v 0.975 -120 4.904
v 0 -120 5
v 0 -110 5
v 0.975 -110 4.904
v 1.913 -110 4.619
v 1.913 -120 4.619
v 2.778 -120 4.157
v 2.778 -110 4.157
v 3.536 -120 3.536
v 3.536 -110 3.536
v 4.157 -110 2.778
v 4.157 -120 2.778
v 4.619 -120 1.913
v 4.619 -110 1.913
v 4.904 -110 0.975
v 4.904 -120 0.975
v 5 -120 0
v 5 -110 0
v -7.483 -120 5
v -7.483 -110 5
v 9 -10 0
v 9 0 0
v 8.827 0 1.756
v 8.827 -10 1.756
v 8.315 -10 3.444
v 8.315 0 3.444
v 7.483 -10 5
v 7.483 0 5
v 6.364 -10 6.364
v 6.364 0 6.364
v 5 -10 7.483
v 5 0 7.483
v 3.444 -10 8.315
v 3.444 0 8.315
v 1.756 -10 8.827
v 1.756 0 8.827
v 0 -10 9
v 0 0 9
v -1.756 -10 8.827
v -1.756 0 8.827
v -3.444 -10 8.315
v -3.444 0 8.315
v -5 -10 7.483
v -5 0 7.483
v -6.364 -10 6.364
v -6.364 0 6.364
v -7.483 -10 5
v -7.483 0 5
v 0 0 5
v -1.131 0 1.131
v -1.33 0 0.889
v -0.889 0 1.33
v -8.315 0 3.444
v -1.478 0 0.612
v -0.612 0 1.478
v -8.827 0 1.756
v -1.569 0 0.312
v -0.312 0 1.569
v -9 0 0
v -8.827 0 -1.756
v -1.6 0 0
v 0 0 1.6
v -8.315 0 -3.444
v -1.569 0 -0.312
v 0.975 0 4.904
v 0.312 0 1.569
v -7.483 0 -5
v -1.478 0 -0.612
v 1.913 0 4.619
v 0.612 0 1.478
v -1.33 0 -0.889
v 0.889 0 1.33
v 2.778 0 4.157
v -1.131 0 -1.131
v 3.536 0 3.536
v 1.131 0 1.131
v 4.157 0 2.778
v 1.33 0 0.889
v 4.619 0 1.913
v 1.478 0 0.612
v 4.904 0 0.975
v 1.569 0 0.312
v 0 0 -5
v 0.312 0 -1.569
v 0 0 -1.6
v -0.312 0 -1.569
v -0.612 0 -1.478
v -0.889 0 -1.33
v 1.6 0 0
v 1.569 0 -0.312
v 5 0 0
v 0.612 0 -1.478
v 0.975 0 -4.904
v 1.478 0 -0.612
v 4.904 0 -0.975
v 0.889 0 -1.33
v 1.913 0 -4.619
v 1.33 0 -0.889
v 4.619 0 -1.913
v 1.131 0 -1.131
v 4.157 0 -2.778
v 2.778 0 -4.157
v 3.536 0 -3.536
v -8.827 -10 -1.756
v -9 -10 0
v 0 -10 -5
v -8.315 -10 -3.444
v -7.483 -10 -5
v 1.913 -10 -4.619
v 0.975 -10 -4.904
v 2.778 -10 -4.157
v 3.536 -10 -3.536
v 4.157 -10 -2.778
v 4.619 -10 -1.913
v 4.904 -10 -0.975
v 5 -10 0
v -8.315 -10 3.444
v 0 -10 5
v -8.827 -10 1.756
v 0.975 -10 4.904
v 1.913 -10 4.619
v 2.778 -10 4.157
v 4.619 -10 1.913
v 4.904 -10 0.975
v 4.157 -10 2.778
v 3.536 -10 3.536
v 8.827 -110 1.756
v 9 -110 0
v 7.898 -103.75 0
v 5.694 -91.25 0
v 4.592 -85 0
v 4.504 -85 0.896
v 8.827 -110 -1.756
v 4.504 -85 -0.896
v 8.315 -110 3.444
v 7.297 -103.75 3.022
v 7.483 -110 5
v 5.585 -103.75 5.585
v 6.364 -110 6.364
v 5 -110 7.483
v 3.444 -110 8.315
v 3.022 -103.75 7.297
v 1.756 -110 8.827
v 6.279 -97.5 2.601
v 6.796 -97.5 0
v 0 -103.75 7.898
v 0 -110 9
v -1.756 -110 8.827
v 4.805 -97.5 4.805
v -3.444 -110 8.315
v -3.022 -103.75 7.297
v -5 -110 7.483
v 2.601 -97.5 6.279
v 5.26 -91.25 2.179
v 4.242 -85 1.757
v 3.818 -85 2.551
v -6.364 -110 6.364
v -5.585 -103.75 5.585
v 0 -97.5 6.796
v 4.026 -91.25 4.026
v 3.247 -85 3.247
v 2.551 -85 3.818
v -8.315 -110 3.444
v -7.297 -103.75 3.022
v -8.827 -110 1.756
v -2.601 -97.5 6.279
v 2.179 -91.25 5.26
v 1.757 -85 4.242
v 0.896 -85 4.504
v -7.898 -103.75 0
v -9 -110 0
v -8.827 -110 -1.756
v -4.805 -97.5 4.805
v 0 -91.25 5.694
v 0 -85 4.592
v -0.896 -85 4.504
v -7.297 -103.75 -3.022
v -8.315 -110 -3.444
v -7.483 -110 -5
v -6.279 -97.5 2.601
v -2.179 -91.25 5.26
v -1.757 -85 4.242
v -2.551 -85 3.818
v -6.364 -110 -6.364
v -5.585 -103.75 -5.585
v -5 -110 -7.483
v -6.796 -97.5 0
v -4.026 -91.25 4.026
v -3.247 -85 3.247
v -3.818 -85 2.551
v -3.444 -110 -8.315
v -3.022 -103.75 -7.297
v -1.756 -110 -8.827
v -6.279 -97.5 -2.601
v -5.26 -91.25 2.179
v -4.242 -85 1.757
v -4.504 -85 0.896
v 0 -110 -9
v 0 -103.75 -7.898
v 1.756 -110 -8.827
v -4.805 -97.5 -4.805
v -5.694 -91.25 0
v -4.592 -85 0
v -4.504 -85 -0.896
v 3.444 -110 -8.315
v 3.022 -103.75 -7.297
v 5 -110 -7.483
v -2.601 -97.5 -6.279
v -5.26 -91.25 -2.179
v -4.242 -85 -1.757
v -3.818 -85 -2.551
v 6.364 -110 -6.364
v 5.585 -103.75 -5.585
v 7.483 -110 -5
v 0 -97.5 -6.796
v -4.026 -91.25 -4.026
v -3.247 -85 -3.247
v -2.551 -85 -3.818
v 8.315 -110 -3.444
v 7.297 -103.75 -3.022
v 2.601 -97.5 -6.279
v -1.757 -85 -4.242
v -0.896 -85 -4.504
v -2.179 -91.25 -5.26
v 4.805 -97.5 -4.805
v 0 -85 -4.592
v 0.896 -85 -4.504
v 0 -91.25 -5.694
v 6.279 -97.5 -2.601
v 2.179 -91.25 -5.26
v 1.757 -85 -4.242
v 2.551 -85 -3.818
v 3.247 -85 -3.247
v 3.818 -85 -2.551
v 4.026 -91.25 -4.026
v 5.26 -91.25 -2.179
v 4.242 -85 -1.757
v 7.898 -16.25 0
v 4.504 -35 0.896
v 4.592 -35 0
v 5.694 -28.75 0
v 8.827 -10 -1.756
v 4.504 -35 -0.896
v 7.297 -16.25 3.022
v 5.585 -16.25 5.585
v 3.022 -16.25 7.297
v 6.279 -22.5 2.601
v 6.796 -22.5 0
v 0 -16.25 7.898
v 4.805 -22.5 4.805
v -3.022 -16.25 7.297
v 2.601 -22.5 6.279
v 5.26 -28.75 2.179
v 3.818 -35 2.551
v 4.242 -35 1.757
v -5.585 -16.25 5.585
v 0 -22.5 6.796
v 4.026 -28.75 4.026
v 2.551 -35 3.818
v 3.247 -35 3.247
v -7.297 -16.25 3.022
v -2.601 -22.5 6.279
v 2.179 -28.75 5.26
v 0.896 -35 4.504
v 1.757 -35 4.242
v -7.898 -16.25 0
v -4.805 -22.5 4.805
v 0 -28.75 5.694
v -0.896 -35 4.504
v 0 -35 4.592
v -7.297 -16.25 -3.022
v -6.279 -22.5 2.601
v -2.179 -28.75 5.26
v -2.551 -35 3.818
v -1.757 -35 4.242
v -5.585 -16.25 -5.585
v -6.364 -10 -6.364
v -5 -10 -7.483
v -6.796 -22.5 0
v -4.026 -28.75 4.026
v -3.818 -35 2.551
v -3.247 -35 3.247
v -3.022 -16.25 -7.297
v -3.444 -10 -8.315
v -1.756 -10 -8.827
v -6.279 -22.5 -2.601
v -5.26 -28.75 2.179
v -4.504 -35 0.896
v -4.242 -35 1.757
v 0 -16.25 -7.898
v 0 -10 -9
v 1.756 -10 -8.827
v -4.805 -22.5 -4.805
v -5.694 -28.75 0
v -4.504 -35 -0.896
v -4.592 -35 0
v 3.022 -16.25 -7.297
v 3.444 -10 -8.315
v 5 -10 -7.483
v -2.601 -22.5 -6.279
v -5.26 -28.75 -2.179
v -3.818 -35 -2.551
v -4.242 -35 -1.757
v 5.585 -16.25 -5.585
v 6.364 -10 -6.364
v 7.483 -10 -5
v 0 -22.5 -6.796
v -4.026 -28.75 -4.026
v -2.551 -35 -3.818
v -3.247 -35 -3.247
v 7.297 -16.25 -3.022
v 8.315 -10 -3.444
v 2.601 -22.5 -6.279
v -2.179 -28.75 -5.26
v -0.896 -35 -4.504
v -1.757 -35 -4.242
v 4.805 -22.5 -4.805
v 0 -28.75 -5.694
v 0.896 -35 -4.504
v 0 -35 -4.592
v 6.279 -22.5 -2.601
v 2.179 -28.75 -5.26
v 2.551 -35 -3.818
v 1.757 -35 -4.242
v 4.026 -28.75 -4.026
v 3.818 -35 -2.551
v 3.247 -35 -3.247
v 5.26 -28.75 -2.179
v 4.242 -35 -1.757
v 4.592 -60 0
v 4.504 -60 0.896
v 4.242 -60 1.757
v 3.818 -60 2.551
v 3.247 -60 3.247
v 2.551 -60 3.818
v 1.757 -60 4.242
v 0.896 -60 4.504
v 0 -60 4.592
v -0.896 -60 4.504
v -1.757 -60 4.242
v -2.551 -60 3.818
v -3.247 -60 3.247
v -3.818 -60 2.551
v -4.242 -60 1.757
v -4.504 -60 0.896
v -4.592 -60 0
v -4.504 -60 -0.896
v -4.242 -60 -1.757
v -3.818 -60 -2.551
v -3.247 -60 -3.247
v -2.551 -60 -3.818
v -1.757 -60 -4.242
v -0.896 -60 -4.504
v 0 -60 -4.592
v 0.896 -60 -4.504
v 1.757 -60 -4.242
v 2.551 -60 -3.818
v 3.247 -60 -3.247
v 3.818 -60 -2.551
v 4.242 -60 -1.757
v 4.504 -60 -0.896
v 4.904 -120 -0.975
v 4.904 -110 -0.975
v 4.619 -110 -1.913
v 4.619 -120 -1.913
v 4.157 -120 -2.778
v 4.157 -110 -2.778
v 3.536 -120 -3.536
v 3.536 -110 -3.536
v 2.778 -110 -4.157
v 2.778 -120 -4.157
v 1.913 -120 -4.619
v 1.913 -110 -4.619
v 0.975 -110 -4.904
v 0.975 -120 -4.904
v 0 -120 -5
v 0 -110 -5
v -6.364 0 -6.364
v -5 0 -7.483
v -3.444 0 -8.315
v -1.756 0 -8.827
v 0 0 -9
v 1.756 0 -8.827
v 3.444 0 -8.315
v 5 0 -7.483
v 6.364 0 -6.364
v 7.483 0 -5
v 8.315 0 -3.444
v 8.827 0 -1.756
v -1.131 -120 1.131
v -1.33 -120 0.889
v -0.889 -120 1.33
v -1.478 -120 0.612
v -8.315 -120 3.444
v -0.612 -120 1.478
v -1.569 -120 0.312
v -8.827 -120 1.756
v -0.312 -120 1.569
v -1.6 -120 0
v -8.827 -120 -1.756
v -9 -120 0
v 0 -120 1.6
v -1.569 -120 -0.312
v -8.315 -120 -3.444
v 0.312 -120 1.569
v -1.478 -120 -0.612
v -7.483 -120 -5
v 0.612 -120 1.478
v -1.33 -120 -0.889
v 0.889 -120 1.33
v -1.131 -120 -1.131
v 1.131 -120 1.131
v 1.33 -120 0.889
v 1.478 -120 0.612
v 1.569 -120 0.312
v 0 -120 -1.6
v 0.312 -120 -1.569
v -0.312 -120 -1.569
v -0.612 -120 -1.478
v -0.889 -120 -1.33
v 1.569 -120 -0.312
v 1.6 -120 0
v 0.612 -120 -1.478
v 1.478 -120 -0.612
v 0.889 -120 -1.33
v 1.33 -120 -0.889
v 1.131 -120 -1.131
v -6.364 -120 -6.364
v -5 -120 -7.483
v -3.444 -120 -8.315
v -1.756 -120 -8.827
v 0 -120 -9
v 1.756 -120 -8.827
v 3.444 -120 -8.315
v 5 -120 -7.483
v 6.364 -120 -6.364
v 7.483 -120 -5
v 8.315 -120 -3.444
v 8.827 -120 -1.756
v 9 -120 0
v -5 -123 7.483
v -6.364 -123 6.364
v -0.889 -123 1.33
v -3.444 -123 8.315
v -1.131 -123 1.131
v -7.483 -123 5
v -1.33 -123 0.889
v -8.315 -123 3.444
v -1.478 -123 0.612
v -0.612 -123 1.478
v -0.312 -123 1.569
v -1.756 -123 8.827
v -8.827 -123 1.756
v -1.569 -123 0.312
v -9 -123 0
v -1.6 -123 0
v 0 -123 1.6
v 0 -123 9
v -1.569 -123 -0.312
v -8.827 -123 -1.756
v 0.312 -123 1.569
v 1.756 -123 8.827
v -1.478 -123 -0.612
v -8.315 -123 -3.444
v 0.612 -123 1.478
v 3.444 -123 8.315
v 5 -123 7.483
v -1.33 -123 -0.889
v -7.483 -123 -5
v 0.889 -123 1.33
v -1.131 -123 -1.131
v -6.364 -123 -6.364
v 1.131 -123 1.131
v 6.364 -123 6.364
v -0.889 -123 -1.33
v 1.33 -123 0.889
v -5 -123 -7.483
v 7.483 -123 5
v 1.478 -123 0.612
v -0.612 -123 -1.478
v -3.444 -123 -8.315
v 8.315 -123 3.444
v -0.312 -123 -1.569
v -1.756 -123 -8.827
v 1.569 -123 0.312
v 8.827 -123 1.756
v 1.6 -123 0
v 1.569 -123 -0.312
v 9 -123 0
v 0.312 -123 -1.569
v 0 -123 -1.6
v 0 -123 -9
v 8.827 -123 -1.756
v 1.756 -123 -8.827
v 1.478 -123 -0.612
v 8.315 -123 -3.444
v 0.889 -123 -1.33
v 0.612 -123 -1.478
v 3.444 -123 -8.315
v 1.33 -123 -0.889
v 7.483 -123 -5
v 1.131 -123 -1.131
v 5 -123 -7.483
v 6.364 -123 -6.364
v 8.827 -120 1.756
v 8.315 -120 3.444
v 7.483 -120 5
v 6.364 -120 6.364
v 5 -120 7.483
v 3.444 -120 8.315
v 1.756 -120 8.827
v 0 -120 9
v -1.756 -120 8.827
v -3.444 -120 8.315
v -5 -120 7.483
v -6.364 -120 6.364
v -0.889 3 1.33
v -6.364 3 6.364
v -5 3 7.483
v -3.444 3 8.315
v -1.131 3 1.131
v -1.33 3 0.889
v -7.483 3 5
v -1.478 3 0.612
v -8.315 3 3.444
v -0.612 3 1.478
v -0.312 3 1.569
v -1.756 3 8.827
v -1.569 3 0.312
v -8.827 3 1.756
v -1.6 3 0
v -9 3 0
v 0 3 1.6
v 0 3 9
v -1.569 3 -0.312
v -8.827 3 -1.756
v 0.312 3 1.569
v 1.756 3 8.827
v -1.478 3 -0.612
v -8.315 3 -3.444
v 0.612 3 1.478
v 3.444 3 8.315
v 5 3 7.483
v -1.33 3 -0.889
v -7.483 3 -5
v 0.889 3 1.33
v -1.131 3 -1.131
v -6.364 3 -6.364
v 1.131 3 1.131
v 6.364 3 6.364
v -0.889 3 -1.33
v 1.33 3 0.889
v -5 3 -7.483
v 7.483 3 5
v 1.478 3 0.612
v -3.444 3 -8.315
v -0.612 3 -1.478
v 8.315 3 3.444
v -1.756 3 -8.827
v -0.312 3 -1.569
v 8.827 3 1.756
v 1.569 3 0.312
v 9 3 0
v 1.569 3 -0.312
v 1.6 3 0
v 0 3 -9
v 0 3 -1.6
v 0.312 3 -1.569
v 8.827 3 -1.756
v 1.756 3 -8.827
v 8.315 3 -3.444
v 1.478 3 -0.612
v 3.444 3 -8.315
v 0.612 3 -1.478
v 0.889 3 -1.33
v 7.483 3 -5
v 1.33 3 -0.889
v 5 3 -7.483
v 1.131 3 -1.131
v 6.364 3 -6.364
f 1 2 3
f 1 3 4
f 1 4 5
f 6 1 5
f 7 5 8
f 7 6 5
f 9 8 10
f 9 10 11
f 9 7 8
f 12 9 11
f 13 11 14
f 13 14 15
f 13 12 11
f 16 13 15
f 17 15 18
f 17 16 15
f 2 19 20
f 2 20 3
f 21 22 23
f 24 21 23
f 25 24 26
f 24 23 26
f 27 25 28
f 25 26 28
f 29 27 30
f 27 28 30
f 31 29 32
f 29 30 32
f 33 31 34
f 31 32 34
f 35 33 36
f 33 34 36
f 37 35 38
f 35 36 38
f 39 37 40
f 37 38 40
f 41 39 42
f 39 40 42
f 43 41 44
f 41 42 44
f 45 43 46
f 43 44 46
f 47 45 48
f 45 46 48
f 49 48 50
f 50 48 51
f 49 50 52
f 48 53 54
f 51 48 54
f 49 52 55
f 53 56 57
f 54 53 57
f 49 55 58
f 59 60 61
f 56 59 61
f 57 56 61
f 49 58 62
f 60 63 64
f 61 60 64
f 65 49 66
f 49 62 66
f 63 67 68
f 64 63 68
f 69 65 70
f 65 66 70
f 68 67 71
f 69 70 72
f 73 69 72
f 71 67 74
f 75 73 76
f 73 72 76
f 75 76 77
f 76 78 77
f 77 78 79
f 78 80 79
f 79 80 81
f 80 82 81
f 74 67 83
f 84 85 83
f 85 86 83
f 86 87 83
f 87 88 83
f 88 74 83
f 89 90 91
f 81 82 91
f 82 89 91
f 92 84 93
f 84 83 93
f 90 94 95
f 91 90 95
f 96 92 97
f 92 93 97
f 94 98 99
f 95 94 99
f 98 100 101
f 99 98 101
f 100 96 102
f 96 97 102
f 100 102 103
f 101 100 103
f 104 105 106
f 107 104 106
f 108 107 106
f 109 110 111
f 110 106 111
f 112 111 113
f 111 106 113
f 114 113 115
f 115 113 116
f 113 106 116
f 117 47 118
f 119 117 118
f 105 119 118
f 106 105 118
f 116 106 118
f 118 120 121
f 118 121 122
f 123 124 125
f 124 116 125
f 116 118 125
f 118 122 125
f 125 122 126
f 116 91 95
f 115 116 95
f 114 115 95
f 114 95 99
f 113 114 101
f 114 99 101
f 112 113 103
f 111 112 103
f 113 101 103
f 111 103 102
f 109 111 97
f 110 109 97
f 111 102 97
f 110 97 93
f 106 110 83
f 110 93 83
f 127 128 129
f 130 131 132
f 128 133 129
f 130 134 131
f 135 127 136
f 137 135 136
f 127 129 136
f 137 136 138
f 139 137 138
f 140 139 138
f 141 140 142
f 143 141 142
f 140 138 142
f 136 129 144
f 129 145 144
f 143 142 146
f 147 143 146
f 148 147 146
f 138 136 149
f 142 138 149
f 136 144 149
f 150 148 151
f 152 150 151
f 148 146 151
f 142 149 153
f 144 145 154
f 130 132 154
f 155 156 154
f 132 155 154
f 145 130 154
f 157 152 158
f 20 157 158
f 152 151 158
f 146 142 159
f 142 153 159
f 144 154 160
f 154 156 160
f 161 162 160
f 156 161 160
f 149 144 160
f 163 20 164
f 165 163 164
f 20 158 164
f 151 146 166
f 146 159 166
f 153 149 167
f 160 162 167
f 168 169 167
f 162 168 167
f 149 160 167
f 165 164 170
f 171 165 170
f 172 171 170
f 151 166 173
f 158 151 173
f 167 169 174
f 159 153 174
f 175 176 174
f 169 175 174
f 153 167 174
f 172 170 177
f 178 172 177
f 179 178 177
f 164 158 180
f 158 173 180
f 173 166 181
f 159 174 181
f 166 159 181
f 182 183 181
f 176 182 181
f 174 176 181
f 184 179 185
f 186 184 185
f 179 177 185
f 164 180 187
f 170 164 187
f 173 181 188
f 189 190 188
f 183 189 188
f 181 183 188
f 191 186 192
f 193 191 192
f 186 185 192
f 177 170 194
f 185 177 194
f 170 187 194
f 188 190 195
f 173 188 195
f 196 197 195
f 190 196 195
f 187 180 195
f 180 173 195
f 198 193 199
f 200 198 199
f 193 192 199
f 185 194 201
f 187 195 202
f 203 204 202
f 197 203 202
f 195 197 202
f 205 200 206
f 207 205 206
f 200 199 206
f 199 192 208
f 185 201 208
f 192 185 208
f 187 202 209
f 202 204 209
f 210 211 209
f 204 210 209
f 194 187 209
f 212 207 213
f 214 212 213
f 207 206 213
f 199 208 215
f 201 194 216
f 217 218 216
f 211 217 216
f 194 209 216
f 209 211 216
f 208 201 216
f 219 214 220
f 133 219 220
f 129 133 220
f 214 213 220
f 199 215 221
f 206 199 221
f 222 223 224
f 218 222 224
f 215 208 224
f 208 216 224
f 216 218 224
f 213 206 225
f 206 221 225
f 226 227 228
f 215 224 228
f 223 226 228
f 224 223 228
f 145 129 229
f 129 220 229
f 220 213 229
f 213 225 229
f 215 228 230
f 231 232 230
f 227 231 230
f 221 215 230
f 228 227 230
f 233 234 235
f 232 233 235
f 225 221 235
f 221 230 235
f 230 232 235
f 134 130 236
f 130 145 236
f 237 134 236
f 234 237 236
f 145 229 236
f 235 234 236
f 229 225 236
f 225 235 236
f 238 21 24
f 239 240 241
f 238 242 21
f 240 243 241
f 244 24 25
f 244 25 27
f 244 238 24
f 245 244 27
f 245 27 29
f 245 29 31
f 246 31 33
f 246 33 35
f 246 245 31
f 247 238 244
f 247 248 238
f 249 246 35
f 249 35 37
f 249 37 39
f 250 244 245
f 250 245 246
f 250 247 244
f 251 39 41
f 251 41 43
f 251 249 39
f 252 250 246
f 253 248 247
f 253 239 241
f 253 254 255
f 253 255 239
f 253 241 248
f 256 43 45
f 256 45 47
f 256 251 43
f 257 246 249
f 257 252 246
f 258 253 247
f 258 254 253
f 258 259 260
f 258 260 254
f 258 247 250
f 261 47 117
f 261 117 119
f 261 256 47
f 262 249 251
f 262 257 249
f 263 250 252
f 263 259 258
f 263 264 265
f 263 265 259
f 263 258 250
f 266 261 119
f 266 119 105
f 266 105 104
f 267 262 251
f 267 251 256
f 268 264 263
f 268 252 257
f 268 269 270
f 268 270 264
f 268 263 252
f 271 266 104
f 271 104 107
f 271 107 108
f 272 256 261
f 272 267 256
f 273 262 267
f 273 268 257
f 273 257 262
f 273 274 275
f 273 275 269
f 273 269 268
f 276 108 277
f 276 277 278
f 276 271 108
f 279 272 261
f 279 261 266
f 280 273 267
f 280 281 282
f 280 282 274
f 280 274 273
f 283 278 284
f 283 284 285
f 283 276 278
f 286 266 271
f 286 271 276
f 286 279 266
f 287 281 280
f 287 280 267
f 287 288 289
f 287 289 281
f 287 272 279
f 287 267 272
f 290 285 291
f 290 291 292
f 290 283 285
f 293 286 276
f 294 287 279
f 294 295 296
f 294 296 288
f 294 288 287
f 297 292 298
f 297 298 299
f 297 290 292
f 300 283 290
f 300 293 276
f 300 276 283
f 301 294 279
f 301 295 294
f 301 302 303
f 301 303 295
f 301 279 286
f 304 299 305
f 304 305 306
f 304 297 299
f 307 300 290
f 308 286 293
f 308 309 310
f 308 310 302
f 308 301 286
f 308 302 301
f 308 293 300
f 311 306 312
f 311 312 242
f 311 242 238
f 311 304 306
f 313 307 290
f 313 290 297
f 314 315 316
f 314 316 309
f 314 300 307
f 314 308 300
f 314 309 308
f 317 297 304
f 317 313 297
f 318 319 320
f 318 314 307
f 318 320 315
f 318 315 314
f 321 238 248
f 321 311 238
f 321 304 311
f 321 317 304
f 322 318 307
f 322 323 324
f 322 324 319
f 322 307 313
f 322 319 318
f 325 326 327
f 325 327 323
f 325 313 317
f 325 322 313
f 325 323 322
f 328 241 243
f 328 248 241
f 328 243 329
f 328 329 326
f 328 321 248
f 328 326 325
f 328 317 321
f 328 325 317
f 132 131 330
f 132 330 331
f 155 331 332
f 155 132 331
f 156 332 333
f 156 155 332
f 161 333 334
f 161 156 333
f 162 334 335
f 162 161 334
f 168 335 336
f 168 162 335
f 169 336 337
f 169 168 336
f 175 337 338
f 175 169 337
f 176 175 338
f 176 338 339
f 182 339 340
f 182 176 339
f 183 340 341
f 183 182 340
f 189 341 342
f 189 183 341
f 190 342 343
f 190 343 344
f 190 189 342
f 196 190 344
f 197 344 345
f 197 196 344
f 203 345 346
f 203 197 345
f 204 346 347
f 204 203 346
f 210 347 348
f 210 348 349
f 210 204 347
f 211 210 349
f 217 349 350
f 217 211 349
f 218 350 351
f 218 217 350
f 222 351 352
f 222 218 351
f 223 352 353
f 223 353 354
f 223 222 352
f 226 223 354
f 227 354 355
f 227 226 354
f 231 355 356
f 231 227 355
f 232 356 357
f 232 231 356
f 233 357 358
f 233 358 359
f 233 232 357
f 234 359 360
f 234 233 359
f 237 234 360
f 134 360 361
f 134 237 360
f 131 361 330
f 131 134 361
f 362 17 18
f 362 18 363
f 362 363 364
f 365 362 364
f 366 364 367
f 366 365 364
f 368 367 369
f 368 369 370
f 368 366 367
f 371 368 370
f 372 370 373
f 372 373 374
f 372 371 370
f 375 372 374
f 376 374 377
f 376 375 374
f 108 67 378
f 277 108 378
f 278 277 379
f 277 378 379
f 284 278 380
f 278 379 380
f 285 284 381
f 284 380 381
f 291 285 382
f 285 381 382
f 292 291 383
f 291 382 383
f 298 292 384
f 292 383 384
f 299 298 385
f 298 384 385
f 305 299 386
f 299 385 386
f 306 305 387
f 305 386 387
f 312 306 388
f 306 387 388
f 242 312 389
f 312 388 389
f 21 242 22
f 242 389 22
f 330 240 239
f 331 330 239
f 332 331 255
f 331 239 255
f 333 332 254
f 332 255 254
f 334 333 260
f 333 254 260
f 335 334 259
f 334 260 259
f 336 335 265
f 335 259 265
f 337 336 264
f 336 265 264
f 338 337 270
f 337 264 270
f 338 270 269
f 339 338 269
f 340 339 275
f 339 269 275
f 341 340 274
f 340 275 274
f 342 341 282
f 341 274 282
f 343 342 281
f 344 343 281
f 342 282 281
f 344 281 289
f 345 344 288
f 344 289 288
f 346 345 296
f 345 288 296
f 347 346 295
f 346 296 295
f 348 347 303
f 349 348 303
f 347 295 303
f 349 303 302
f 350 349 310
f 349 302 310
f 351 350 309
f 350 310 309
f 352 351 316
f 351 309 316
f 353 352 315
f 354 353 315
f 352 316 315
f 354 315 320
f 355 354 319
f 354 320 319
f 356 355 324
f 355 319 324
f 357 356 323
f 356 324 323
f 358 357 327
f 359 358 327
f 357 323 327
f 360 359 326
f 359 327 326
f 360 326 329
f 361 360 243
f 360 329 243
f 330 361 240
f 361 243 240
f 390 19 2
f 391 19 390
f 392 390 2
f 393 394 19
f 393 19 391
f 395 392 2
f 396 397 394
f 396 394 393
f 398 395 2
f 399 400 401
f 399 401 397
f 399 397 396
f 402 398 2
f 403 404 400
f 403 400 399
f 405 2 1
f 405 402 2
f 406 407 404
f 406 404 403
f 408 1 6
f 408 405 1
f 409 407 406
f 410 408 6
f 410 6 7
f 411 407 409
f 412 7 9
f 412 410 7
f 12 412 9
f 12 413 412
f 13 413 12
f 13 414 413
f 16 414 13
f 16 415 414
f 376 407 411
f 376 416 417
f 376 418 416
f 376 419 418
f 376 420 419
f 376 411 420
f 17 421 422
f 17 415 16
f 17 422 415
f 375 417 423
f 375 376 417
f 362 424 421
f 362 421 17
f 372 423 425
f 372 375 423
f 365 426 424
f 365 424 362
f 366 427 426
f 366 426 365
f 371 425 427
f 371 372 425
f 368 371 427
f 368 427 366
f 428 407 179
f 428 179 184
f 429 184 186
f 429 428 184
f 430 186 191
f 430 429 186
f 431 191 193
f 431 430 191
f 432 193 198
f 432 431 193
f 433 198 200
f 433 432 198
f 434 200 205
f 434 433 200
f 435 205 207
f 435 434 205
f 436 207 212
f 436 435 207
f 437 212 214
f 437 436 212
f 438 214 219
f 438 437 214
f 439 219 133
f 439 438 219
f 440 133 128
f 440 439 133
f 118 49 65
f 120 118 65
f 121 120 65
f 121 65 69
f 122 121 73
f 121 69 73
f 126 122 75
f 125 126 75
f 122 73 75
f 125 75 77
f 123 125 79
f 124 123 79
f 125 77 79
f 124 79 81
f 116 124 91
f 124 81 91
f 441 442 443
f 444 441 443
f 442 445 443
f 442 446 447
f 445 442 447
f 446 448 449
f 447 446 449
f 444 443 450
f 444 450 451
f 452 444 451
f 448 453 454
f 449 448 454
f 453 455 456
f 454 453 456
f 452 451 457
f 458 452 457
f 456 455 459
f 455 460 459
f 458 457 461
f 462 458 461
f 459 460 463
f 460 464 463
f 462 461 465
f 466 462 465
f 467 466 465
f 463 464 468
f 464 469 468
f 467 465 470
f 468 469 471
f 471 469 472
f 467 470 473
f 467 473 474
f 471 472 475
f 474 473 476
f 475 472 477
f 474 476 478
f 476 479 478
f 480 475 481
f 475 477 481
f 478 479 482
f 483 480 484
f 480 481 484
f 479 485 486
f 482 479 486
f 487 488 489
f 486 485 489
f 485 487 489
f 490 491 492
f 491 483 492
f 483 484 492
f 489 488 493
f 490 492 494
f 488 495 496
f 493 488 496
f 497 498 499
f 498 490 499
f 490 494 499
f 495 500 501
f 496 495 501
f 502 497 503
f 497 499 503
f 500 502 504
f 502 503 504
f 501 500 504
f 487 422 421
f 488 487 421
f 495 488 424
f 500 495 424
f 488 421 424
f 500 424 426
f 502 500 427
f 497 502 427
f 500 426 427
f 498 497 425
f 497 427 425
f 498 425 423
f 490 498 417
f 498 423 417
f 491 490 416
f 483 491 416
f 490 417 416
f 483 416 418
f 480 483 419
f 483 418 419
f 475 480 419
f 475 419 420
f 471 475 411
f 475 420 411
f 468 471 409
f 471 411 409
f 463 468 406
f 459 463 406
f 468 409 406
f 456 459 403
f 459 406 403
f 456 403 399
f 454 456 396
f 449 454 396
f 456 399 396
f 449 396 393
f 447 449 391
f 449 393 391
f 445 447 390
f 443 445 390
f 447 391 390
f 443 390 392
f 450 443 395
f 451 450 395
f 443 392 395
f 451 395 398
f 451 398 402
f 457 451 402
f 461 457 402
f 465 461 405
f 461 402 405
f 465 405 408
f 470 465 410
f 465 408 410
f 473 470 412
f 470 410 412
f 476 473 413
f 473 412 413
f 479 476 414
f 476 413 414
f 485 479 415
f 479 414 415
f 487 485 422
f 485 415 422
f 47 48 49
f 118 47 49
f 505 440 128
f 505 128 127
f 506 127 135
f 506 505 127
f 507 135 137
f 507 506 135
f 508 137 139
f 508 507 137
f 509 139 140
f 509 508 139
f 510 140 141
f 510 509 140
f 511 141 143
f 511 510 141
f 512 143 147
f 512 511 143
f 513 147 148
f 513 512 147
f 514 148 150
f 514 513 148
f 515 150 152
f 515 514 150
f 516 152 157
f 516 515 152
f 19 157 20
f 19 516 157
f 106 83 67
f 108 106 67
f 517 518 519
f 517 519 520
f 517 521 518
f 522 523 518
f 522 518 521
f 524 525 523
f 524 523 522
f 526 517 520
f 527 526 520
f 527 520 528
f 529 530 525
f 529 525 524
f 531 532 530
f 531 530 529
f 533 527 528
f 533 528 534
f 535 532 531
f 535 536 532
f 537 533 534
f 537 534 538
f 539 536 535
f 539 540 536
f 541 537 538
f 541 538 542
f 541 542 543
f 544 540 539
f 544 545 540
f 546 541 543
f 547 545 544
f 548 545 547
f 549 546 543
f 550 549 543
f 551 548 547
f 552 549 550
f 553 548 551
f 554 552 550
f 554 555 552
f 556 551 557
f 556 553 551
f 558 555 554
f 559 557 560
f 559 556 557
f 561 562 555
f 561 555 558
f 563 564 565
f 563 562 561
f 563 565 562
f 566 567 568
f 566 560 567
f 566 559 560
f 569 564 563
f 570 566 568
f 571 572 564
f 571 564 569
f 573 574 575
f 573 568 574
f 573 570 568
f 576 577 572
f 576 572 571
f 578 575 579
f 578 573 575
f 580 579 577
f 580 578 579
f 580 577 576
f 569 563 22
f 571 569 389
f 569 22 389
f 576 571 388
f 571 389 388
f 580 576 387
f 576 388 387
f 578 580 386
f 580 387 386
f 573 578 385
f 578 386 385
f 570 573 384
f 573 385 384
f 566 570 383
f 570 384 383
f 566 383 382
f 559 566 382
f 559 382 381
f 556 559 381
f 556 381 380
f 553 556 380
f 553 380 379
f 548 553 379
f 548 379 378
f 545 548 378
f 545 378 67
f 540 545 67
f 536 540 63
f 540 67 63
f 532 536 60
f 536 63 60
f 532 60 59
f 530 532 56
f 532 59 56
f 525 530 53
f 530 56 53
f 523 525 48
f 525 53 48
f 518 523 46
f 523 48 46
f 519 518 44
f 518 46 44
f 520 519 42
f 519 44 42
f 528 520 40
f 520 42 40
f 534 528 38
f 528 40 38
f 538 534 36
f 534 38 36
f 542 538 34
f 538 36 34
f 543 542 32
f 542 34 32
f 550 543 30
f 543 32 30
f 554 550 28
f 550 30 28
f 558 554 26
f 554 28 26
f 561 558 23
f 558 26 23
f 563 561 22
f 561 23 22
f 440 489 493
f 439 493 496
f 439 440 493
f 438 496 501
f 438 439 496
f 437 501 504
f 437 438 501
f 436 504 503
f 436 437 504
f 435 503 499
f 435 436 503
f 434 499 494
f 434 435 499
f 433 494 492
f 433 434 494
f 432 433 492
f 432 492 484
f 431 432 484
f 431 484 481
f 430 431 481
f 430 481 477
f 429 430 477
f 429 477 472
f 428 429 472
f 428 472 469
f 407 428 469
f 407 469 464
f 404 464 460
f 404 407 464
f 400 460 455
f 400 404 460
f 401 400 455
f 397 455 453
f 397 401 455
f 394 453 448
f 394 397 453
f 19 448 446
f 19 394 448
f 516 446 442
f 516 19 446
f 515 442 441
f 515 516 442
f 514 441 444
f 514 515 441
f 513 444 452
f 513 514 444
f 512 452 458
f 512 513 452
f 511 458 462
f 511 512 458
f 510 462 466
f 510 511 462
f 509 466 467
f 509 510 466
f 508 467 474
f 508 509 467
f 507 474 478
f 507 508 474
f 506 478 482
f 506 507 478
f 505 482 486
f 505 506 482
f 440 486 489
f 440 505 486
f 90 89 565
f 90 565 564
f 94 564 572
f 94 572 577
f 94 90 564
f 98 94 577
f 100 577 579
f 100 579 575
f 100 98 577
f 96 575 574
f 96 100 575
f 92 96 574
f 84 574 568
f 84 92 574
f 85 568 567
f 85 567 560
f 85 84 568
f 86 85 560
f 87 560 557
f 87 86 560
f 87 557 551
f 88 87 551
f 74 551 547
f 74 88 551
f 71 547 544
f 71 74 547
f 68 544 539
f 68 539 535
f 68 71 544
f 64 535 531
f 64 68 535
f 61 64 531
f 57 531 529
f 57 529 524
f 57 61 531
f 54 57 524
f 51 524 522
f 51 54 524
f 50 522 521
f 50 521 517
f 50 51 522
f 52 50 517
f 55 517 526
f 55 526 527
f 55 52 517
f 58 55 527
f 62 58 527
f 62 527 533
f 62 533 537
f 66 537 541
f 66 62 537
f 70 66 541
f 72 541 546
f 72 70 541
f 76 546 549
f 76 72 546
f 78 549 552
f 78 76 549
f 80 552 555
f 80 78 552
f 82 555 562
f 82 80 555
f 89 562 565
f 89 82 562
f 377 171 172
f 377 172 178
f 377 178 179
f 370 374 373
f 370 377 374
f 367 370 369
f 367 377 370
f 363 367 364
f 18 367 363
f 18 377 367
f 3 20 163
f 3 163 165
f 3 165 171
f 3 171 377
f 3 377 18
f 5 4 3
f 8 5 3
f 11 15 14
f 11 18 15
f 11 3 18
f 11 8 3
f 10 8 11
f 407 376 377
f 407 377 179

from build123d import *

# Parameters (mm, degrees)
SKETCH1_R           = 9
SKETCH1_R_2         = 1.6
BOSS_EXTRUDE1_DEPTH = 3
BOSS_EXTRUDE2_DEPTH = 10
SKETCH3_R           = 9
BOSS_EXTRUDE3_DEPTH = 25
BOSS_EXTRUDE3_TAPER = 10
SKETCH4_R           = 4.591825482
BOSS_EXTRUDE4_DEPTH = 25


with BuildPart() as part:
    # Sketch1 → Boss-Extrude1 (new body)
    with BuildSketch(Plane(origin=(0, 0, 0), x_dir=(1, 0, 0), z_dir=(0, 1, 0))):
        Circle(SKETCH1_R)
        Circle(SKETCH1_R_2, mode=Mode.SUBTRACT)
    boss_extrude1 = extrude(amount=BOSS_EXTRUDE1_DEPTH)

    # Sketch2 → Boss-Extrude2 (add)
    with BuildSketch(Plane.XZ):
        with BuildLine():
            Line((-7.483314774, 5), (0, 5))
            ThreePointArc((0, 5), (3.535533906, 3.535533906), (5, 0))
            ThreePointArc((5, 0), (3.535533906, -3.535533906), (0, -5))
            Line((0, -5), (-7.483314774, -5))
            ThreePointArc((-7.483314774, -5), (2.61248608, -8.61248608), (9, 0))
            ThreePointArc((9, 0), (2.61248608, 8.61248608), (-7.483314774, 5))
        make_face()
    boss_extrude2 = extrude(amount=BOSS_EXTRUDE2_DEPTH)

    # Sketch3 → Boss-Extrude3 (add)
    with BuildSketch(Plane.XZ.offset(10)):
        Circle(SKETCH3_R)
    boss_extrude3 = extrude(amount=BOSS_EXTRUDE3_DEPTH, taper=BOSS_EXTRUDE3_TAPER)

    # Sketch4 → Boss-Extrude4 (add)
    with BuildSketch(Plane.XZ.offset(35)):
        Circle(SKETCH4_R)
    boss_extrude4 = extrude(amount=BOSS_EXTRUDE4_DEPTH)

    # Mirror2: Boss-Extrude1, Boss-Extrude2, Boss-Extrude3, Boss-Extrude4 across plane
    add(boss_extrude1.mirror(Plane(origin=(0, -60, 0), x_dir=(0, 0, 1), z_dir=(0, -1, 0))))
    add(boss_extrude2.mirror(Plane(origin=(0, -60, 0), x_dir=(0, 0, 1), z_dir=(0, -1, 0))))
    add(boss_extrude3.mirror(Plane(origin=(0, -60, 0), x_dir=(0, 0, 1), z_dir=(0, -1, 0))))
    add(boss_extrude4.mirror(Plane(origin=(0, -60, 0), x_dir=(0, 0, 1), z_dir=(0, -1, 0))))


solid = part.part
